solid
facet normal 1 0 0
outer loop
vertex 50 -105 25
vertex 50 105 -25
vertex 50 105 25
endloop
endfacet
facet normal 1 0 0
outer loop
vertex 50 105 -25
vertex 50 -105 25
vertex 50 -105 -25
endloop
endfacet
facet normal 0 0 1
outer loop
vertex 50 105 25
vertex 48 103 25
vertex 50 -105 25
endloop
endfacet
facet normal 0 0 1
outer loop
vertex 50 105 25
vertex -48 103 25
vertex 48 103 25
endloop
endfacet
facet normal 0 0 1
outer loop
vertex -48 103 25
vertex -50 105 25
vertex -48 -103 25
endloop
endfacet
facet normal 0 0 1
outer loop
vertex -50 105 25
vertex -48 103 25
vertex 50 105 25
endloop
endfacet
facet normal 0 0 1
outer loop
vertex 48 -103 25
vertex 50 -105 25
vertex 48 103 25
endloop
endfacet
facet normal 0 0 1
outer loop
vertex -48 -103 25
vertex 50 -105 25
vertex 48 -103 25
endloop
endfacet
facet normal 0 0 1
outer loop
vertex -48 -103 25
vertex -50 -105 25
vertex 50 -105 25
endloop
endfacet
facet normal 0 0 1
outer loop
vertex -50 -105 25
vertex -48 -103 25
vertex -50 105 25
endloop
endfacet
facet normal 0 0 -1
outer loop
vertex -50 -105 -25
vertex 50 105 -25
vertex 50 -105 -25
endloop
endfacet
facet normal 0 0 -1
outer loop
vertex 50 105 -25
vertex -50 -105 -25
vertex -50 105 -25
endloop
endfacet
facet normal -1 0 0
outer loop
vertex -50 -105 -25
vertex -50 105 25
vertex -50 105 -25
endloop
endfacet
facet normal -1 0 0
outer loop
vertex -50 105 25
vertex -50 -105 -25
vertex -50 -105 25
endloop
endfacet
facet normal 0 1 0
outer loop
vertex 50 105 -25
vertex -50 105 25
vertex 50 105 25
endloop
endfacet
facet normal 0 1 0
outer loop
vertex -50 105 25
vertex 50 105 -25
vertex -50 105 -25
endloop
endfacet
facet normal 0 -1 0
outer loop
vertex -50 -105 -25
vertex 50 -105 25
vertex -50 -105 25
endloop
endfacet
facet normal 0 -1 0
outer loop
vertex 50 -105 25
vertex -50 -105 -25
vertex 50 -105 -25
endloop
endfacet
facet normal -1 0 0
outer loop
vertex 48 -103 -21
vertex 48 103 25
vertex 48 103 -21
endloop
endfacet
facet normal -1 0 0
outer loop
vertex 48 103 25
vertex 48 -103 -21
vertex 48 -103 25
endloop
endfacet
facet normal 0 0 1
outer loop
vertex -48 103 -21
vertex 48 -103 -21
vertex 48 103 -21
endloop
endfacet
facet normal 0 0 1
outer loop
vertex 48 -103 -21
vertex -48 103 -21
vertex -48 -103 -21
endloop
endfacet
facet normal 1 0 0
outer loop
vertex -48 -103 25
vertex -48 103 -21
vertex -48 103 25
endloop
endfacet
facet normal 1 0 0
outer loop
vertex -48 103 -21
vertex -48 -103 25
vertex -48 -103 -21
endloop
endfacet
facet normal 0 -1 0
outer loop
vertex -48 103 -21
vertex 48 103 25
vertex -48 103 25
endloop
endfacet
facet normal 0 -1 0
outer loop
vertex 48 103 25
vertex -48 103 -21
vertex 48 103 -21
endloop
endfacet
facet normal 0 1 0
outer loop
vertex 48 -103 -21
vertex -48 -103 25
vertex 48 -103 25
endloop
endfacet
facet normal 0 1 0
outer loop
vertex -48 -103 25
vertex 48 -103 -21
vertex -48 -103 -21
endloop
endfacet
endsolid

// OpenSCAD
cx = 100;
cy = 210; //130 + 40 + 40
cz = 50;
th = 4; // thickness of the walls

module caseBase()
{
    difference (){
    cube([cx,cy,cz],true);
    translate([0,0,th])
    cube([cx-th,cy-th,cz],true);
    }
}

caseBase();
